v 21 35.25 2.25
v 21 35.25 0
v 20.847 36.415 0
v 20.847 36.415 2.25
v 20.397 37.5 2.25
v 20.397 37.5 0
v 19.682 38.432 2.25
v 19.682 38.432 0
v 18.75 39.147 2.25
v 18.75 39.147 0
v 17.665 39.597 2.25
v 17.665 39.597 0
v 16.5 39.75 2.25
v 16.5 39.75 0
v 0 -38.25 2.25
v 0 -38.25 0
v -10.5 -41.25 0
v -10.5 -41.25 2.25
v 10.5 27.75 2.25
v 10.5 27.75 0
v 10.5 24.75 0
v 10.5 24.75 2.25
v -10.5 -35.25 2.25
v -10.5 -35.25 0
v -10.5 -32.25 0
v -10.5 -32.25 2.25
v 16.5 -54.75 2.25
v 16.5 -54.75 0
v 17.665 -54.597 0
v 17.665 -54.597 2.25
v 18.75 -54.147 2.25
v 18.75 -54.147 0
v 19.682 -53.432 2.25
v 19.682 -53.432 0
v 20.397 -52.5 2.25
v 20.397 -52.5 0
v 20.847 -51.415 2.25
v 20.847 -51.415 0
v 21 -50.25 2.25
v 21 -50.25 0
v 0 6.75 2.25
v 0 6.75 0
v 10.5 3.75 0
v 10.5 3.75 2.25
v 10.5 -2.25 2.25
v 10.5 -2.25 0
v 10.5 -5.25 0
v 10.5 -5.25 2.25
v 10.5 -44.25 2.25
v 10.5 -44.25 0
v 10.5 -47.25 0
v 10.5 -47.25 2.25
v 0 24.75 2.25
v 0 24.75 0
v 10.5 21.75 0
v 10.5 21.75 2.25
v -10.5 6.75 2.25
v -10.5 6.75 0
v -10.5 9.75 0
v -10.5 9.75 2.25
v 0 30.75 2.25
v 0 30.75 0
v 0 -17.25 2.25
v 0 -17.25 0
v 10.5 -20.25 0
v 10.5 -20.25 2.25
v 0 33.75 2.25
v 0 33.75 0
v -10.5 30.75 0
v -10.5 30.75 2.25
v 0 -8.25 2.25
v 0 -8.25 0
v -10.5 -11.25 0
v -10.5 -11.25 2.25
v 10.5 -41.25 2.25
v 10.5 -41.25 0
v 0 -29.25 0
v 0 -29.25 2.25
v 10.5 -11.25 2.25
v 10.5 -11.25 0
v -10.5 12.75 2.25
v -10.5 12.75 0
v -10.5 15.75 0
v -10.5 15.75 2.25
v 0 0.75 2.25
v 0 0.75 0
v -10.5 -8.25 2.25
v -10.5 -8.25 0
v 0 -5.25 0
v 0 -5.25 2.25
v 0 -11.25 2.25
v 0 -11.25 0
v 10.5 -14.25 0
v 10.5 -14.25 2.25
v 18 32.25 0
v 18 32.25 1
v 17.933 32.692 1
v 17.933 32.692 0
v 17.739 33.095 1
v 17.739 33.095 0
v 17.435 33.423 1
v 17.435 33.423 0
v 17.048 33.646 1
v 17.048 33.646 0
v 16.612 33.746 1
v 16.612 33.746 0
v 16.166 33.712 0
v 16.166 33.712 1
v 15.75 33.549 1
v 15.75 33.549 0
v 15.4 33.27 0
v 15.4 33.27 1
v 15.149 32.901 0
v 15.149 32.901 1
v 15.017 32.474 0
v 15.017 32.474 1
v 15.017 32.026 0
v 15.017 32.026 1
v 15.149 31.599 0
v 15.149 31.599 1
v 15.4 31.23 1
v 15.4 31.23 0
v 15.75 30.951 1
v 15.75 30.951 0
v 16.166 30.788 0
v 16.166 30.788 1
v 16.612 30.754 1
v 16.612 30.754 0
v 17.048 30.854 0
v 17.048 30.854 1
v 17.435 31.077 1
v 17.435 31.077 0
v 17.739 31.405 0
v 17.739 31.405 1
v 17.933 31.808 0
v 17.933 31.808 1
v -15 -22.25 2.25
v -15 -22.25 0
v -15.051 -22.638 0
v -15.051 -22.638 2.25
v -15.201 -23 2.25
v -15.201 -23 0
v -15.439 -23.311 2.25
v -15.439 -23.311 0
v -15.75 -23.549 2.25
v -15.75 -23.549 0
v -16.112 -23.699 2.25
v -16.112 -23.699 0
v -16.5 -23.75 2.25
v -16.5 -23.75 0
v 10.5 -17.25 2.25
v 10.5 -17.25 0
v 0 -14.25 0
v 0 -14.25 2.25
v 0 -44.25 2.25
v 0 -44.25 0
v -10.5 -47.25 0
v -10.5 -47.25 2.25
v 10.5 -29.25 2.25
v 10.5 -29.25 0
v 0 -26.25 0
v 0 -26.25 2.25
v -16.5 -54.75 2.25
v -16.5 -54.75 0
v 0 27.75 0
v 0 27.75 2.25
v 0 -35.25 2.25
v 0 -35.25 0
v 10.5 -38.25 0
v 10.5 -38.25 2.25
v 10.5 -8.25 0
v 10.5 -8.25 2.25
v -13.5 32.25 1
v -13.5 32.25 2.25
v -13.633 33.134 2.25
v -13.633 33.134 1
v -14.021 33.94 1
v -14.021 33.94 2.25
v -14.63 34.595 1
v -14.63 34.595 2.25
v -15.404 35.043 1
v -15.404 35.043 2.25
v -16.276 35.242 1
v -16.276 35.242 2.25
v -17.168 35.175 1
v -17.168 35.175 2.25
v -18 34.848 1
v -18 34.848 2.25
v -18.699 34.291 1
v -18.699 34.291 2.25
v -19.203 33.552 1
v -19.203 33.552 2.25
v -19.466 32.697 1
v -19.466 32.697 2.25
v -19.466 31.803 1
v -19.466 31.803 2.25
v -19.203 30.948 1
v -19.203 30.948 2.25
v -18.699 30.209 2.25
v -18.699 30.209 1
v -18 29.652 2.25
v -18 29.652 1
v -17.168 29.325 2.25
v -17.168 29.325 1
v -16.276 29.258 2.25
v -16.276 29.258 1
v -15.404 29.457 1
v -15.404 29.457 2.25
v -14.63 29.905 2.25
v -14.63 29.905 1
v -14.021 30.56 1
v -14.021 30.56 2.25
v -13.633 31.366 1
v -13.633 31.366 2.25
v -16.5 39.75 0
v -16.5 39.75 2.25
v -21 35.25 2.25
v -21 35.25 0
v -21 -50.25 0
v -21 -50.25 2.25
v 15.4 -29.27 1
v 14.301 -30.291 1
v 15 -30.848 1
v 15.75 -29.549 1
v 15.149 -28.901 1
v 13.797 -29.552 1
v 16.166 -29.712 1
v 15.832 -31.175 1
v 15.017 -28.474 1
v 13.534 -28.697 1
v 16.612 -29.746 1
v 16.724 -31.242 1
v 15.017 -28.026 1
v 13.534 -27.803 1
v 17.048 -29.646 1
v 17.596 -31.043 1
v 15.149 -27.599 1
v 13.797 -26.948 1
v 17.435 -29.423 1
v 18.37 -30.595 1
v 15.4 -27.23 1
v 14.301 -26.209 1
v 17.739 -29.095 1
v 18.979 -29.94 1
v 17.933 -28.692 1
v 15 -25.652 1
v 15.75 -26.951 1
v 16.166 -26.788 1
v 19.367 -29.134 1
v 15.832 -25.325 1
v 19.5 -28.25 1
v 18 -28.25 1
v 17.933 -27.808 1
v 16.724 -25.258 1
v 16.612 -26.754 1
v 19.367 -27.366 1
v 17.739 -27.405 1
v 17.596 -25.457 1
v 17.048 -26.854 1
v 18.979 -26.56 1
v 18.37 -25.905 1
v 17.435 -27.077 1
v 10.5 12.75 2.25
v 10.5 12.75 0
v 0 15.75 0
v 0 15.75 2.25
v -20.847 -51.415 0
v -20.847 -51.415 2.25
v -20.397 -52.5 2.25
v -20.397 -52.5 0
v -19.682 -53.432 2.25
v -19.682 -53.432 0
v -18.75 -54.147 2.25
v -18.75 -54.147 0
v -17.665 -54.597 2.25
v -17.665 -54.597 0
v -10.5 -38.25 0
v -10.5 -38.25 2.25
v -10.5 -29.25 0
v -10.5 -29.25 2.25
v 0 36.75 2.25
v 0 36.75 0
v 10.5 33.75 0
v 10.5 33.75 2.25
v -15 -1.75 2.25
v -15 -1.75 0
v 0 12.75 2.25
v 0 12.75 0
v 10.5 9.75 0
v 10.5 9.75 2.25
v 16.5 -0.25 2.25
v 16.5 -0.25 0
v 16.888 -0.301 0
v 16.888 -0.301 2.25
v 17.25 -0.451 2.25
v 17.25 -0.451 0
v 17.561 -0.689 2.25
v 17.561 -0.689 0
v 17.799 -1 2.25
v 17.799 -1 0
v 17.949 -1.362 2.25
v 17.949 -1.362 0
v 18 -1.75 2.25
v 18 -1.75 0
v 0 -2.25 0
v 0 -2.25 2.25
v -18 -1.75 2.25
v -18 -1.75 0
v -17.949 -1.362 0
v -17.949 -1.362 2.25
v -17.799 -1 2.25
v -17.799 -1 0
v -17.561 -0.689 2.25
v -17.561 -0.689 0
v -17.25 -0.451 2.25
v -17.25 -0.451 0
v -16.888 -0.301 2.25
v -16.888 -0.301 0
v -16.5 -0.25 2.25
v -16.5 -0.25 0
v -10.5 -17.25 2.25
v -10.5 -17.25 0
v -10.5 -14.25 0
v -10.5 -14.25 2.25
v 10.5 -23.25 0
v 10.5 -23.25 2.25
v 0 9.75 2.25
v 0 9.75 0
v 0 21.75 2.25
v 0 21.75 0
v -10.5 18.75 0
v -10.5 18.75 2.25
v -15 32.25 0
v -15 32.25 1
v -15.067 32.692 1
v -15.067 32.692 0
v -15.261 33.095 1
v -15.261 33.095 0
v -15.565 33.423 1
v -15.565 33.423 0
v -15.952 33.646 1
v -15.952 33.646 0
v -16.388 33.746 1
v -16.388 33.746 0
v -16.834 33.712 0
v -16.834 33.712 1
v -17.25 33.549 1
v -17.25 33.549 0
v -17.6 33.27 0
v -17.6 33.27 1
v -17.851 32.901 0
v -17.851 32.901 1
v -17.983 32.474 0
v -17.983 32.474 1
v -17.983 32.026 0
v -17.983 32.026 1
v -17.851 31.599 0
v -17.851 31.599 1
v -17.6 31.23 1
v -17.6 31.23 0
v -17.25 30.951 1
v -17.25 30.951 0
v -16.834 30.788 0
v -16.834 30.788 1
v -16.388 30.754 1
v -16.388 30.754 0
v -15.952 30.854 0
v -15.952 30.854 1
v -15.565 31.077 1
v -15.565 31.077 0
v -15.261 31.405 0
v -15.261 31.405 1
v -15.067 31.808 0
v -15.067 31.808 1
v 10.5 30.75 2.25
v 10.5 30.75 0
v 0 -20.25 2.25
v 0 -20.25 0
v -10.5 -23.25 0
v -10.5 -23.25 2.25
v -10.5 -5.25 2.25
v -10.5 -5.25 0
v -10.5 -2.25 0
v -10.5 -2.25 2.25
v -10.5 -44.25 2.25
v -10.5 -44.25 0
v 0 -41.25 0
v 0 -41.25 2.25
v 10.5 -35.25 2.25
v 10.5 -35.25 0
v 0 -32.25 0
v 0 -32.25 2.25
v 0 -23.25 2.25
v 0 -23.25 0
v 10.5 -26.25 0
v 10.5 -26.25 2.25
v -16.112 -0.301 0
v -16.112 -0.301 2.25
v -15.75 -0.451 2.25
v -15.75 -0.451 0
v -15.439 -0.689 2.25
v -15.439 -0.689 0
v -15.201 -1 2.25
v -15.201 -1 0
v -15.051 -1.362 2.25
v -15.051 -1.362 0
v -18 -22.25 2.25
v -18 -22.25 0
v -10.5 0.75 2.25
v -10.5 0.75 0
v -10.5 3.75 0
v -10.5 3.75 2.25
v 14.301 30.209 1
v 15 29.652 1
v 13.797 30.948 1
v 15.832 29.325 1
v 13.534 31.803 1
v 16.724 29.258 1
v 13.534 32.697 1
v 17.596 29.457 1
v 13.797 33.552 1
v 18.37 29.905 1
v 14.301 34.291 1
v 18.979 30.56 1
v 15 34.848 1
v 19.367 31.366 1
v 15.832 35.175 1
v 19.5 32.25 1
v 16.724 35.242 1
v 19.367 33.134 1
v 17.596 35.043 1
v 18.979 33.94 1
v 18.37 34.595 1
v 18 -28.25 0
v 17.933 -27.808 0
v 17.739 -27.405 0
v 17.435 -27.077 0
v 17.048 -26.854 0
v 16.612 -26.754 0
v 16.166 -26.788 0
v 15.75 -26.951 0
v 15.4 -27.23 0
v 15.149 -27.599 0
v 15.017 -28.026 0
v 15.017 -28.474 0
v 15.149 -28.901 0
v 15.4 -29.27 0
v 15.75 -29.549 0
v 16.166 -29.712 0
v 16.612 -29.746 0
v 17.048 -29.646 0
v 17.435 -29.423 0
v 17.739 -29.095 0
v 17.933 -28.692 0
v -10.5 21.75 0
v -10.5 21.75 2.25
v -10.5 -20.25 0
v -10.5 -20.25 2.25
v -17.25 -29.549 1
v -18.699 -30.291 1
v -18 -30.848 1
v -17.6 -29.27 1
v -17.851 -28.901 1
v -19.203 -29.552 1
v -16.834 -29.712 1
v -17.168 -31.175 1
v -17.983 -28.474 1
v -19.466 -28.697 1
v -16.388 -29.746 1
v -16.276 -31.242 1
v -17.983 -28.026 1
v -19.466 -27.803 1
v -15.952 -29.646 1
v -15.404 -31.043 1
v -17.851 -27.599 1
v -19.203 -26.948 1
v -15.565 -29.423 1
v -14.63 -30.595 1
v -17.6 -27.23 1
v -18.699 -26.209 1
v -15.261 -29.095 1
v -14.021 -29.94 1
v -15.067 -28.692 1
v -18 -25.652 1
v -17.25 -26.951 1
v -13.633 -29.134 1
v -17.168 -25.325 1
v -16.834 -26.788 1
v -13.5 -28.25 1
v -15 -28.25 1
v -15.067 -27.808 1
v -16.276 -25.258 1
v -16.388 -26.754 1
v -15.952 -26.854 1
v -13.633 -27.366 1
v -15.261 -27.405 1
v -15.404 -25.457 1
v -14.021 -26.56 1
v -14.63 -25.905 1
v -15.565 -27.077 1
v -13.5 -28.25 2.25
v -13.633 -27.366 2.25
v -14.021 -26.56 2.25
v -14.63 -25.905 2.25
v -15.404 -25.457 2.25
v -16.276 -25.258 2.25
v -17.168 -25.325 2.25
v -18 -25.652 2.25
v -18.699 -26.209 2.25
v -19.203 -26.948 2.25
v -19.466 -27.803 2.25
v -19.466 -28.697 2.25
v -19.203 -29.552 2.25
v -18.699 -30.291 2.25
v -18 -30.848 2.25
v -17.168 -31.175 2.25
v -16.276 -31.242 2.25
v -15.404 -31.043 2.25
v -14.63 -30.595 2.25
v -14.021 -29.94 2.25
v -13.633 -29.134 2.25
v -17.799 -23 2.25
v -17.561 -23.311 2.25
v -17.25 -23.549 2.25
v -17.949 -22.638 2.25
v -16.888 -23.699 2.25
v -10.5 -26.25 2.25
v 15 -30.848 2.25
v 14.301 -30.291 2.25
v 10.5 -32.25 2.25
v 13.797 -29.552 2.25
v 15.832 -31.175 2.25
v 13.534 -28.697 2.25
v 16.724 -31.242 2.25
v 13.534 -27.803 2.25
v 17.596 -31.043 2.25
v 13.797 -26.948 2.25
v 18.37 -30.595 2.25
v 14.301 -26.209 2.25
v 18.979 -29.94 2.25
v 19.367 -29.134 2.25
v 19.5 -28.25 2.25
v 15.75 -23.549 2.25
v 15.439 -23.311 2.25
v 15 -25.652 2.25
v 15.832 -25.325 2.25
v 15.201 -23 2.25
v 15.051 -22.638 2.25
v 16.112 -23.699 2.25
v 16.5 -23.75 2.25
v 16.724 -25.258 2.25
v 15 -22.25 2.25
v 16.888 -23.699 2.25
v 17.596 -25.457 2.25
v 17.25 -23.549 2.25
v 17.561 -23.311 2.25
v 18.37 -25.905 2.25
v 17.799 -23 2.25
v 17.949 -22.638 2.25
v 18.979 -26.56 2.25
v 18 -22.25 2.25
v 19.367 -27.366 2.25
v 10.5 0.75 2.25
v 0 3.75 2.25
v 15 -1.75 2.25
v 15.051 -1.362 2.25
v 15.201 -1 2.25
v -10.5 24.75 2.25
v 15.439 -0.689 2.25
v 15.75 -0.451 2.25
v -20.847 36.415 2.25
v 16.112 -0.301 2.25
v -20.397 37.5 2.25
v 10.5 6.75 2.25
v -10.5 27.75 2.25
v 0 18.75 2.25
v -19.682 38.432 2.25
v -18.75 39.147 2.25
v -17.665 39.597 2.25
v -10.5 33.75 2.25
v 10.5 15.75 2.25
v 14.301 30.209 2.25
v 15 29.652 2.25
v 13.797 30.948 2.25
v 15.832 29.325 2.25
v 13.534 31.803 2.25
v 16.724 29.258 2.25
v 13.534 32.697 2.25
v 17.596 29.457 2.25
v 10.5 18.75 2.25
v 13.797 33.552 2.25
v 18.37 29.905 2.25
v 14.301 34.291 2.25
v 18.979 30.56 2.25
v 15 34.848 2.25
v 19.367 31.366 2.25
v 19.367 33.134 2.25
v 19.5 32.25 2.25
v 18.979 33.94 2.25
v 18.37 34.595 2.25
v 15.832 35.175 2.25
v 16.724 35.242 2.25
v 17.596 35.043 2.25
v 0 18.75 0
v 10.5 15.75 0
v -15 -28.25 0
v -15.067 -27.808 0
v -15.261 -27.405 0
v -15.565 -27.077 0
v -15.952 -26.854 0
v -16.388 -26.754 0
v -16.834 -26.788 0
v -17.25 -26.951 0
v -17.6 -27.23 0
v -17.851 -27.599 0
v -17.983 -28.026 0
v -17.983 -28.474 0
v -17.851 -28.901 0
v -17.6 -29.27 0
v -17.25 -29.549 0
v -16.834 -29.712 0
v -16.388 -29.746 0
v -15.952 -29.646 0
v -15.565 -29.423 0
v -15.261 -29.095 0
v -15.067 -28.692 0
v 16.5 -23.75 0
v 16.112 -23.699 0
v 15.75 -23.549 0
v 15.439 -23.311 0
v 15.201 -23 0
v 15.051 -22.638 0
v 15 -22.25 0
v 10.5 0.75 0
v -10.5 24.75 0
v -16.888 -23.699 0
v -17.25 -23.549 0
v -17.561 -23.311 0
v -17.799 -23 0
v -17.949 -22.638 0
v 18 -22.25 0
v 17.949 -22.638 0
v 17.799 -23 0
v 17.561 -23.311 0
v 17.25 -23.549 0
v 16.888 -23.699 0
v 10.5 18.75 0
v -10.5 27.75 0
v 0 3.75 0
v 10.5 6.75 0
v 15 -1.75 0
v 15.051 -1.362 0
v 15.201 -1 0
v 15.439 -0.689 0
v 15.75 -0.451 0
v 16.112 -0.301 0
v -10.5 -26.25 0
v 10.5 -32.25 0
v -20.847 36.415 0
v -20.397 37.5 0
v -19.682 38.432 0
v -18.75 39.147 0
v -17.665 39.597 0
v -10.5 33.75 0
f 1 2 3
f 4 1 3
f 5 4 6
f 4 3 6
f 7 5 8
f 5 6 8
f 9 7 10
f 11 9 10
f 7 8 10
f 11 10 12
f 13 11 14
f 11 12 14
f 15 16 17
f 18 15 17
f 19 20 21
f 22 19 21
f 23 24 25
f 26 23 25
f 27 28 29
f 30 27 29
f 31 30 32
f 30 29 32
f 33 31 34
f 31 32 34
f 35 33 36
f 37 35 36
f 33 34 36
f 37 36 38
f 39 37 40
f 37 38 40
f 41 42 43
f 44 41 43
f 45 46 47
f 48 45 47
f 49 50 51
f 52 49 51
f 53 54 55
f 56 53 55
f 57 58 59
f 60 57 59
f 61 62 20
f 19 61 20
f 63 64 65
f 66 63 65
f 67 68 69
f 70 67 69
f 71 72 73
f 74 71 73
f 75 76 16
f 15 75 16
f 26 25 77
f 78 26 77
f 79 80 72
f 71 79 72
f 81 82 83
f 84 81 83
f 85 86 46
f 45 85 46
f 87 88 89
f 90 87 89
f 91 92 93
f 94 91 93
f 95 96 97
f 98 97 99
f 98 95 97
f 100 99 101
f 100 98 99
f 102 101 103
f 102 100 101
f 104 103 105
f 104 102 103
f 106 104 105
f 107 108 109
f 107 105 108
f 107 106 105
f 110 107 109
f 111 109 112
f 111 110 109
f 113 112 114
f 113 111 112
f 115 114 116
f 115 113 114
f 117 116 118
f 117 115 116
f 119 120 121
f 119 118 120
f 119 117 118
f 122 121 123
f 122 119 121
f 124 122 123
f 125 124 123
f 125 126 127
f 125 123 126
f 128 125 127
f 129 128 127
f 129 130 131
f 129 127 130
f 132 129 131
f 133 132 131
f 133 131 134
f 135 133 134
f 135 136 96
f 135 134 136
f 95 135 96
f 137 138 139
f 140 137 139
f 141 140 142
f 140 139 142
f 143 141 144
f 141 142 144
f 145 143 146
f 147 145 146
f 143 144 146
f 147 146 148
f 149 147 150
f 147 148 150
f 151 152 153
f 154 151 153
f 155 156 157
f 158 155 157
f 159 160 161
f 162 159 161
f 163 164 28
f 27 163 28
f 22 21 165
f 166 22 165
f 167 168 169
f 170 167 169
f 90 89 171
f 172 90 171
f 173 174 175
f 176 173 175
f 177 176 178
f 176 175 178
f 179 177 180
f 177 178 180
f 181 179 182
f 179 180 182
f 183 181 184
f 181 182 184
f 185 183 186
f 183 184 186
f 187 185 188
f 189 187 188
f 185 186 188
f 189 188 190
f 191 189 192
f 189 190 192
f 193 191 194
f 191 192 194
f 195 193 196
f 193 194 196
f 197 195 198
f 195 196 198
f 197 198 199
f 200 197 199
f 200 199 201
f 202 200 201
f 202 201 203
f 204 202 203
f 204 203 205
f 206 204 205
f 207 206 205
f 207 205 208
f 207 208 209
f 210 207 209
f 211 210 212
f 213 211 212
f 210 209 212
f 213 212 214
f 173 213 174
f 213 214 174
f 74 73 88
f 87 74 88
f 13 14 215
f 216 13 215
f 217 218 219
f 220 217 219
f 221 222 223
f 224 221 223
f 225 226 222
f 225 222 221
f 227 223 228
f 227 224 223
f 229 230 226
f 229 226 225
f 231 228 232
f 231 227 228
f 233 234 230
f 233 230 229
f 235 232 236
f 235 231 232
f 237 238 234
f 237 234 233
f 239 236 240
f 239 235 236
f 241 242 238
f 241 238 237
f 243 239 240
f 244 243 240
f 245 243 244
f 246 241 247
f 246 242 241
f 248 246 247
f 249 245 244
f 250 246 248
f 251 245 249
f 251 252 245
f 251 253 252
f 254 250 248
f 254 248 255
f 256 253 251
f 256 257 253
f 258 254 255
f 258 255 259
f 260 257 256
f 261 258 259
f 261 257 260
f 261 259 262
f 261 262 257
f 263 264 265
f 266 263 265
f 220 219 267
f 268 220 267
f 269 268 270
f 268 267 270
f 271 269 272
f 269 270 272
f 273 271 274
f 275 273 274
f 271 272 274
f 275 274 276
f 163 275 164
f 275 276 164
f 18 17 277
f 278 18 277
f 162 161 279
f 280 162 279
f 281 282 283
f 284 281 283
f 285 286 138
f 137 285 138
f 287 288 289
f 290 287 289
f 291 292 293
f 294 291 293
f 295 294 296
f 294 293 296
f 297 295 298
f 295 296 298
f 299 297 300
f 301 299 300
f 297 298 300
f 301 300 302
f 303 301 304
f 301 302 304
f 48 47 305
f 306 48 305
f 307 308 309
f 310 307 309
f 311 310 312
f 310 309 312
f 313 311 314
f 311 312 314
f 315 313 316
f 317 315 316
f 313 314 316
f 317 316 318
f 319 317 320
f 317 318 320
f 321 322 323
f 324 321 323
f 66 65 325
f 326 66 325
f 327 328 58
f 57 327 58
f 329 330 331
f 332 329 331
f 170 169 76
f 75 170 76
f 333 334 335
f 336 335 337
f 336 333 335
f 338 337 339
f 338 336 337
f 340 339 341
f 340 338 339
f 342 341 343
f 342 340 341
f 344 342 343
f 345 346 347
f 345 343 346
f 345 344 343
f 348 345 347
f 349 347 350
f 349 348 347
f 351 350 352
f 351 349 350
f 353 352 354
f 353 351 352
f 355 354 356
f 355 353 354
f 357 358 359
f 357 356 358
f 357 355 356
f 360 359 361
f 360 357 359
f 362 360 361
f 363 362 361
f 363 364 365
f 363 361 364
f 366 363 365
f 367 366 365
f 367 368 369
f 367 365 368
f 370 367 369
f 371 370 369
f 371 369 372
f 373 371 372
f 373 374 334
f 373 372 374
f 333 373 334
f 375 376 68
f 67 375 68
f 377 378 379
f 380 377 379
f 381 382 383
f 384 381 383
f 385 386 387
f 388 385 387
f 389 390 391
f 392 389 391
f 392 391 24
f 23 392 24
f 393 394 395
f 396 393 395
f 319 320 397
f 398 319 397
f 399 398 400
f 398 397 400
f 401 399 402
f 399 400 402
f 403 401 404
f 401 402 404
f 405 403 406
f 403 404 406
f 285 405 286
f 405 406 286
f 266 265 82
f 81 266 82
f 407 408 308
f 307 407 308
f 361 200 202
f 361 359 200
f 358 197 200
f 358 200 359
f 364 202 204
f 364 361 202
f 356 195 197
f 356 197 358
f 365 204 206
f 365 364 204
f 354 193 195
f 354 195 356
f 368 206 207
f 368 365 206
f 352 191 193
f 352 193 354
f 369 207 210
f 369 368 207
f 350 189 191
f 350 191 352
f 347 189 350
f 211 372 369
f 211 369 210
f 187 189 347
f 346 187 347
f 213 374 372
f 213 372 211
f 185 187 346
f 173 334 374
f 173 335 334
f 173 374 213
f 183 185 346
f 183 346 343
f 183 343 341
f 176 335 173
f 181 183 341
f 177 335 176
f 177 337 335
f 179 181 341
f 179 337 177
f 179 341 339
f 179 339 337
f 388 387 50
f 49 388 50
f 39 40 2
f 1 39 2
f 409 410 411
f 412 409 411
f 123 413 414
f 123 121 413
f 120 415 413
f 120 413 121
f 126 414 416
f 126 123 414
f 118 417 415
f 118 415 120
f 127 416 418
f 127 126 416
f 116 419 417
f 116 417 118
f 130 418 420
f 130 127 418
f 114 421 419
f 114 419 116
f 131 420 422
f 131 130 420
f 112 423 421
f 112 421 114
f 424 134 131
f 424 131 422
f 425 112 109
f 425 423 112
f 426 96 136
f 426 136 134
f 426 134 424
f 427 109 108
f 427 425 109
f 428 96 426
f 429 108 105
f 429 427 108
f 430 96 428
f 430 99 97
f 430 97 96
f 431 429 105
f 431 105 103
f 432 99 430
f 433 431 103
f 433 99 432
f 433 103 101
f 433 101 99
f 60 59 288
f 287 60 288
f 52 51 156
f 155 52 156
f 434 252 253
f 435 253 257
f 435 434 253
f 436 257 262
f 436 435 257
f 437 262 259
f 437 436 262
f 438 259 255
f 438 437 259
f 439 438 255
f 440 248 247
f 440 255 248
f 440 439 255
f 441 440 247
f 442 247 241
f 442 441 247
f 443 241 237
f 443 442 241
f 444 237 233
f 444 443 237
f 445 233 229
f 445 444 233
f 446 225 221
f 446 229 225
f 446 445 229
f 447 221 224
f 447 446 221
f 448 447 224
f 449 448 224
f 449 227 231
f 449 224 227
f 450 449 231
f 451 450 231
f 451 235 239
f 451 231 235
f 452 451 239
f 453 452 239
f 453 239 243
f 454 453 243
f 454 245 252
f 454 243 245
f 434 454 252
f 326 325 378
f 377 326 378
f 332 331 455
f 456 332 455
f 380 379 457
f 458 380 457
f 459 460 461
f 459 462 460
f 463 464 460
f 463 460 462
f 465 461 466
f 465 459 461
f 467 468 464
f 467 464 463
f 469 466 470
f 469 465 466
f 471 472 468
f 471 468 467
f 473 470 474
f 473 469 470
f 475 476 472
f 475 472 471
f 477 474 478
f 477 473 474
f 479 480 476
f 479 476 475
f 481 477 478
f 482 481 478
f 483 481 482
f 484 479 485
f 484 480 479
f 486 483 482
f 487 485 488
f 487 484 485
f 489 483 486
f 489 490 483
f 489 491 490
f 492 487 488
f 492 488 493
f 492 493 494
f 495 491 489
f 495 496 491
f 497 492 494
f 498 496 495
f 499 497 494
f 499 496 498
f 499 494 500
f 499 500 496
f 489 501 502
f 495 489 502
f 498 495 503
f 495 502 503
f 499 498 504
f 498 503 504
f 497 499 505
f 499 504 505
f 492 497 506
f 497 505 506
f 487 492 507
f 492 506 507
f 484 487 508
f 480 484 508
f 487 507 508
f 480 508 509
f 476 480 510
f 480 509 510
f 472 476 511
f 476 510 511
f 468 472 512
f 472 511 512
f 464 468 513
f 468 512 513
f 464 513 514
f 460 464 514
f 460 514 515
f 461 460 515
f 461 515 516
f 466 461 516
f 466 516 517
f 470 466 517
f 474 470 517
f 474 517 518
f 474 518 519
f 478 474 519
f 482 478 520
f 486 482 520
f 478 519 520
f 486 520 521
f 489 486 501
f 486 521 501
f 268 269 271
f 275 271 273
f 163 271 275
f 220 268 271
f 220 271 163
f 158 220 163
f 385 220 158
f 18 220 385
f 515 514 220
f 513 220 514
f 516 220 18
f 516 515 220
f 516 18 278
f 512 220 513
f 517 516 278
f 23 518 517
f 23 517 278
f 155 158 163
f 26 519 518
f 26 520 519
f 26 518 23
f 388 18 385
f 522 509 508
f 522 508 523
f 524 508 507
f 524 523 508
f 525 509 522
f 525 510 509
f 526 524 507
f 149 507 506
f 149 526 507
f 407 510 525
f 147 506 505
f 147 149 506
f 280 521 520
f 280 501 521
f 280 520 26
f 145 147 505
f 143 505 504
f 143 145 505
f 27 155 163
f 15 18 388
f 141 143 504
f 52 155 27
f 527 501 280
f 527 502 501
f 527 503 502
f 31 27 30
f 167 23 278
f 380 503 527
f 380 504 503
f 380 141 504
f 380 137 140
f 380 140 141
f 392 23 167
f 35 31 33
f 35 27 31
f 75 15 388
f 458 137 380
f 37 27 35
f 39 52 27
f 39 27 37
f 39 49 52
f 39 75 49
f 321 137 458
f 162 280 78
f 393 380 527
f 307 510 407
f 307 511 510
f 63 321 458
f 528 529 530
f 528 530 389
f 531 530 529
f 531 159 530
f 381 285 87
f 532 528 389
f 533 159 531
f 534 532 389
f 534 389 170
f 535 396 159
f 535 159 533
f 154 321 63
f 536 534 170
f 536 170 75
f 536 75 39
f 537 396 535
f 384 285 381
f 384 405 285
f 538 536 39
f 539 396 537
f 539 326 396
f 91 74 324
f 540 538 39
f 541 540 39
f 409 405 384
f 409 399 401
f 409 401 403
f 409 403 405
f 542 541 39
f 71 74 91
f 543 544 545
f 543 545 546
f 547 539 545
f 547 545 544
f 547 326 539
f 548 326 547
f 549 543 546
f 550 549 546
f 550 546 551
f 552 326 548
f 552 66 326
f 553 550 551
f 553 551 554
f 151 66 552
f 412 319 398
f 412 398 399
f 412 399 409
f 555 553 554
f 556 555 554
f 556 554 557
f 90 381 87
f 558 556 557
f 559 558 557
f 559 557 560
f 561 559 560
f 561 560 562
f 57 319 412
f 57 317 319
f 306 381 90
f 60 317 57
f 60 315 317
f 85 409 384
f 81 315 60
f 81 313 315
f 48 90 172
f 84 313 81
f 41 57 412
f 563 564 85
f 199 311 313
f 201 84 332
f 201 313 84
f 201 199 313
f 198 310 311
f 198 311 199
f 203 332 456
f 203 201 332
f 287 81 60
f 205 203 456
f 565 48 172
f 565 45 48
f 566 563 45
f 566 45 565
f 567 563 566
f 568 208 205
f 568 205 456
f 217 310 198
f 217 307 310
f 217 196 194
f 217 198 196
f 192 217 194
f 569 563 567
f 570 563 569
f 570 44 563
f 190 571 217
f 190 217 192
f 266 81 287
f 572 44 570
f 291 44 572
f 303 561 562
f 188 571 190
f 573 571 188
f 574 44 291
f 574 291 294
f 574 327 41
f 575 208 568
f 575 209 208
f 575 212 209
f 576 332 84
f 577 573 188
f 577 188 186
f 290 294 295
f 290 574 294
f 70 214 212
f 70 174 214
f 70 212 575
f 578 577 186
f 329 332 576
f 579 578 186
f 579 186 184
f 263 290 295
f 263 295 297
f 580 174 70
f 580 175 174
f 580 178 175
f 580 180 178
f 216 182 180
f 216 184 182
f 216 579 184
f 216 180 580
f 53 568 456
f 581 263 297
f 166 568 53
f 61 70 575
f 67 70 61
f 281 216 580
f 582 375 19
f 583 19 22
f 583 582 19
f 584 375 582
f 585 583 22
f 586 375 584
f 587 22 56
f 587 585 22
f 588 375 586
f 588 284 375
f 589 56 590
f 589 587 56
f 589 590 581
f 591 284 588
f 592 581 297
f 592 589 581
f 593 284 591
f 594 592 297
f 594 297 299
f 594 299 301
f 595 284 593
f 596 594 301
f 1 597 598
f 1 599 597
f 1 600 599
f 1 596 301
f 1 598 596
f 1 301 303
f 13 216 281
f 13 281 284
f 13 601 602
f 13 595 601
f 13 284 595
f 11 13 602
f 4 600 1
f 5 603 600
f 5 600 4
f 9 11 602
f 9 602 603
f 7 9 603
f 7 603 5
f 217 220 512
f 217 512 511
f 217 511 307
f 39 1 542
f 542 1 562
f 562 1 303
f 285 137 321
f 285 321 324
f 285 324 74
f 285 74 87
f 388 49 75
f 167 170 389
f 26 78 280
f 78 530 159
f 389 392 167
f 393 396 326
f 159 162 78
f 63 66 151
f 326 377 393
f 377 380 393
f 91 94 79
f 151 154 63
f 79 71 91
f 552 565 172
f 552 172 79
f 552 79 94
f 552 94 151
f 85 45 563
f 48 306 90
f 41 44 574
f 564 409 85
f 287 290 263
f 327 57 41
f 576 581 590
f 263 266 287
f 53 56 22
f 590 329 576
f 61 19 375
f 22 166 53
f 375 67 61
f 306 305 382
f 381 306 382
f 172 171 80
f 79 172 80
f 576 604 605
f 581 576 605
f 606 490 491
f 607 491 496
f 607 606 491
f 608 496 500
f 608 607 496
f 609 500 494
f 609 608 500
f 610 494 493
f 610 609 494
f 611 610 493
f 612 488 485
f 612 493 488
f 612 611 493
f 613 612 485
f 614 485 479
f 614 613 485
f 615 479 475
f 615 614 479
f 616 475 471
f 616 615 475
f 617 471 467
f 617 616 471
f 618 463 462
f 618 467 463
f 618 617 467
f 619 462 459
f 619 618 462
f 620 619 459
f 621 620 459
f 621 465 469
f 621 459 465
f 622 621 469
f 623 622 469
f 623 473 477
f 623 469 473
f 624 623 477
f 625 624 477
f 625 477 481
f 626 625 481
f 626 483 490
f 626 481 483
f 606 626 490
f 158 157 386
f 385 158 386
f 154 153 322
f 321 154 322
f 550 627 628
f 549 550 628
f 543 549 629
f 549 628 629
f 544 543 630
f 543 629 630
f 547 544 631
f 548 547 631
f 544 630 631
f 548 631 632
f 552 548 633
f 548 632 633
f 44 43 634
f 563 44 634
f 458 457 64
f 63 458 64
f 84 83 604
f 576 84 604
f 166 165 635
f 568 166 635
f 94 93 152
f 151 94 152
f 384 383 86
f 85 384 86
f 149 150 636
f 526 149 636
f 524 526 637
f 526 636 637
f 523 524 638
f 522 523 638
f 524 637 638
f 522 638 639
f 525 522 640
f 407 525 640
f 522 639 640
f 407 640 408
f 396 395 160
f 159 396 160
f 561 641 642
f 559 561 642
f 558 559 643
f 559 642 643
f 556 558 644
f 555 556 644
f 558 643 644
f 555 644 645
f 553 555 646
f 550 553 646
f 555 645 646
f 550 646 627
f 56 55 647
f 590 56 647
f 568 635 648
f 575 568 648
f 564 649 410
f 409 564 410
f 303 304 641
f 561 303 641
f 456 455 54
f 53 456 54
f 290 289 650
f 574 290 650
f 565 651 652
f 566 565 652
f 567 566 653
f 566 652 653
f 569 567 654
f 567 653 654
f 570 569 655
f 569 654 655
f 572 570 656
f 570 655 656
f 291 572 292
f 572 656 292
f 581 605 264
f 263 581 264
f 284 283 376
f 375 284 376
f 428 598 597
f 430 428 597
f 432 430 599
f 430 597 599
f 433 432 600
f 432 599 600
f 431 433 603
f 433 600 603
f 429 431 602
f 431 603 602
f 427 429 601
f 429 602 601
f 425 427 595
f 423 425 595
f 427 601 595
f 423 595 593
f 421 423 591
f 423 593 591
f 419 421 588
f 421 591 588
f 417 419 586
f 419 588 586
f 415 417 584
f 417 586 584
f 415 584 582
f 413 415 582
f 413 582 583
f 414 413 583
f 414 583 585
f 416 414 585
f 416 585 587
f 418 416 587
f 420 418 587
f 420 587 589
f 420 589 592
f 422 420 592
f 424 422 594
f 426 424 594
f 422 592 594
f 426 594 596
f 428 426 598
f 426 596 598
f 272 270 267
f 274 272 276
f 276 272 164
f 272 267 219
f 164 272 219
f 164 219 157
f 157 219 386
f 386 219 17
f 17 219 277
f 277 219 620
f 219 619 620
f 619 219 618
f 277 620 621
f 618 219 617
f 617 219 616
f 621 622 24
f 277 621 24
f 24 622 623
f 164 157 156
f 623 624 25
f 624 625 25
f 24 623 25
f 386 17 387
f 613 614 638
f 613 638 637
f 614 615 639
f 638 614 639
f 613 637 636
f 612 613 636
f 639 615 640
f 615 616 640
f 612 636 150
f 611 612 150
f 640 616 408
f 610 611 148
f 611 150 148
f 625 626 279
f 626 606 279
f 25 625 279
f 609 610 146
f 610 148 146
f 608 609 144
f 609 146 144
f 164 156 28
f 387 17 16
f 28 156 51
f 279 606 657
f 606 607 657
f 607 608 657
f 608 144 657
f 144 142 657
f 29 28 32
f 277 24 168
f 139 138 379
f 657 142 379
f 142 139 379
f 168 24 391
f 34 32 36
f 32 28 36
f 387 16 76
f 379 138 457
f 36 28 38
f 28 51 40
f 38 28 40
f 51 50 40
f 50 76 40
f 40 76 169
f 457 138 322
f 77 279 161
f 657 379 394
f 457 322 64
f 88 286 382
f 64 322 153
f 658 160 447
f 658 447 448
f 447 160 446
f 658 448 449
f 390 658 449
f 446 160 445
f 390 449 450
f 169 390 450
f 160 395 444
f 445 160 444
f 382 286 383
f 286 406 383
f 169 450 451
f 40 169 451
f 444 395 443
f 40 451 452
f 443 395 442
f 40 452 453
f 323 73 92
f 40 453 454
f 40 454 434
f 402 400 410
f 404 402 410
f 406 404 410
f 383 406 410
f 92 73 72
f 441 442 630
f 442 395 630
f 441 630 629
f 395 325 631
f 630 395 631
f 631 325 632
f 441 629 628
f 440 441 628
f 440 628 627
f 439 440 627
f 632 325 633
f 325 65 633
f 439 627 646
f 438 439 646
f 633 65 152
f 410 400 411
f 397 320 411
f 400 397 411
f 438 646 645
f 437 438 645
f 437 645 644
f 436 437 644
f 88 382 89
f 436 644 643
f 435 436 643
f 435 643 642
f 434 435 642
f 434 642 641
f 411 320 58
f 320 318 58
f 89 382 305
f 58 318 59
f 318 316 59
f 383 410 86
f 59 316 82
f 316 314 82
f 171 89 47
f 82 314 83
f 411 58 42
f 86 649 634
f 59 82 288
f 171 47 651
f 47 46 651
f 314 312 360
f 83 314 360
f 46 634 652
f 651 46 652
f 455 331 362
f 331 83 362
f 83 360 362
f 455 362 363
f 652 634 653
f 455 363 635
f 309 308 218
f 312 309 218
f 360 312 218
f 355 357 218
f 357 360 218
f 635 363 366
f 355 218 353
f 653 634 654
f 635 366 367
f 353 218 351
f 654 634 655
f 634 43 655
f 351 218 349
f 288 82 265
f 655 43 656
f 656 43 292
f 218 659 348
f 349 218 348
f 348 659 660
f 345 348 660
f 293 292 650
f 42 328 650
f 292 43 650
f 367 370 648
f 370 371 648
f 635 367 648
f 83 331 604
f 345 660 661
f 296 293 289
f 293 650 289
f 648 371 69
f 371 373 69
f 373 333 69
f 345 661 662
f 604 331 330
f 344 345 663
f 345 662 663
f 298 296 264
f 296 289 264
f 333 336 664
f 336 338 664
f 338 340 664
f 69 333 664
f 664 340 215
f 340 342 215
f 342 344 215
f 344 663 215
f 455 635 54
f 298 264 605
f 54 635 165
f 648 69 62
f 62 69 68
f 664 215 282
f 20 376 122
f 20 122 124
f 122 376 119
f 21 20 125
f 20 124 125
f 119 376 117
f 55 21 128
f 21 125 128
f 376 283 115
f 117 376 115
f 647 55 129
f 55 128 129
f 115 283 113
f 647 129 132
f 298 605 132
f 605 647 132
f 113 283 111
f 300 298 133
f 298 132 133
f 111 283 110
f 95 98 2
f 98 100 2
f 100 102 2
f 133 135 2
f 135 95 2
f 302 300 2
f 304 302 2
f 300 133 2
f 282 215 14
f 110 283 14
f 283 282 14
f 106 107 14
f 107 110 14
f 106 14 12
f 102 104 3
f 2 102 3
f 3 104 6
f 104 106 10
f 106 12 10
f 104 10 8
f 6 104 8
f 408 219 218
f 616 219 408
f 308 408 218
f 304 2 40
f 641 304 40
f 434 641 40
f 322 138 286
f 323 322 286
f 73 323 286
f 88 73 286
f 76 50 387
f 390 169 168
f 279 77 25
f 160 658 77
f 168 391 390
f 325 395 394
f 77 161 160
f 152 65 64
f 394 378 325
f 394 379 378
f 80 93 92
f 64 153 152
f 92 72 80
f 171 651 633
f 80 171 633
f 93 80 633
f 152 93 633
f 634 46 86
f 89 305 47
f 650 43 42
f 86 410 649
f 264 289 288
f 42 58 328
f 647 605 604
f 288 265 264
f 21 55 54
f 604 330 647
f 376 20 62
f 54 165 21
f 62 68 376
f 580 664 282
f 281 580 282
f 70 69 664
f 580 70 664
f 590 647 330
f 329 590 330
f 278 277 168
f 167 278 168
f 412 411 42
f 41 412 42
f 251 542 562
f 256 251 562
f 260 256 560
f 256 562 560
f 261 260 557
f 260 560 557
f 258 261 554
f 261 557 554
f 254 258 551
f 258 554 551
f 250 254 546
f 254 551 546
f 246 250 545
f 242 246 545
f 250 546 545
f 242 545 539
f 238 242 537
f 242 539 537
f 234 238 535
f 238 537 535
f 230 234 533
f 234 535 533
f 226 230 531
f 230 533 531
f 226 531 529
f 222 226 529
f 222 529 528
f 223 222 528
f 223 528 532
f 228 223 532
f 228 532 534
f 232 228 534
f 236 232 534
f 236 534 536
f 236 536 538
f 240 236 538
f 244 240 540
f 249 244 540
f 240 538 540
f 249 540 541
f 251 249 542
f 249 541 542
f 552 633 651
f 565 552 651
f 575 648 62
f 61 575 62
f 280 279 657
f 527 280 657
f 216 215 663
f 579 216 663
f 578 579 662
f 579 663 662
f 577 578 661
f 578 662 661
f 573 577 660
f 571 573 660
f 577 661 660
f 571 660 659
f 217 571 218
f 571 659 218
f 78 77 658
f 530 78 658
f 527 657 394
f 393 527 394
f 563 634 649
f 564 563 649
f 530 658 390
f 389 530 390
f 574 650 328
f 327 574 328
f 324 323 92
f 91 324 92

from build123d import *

# Parameters (mm, degrees)
F0_R     = 1.5
F1_DEPTH = 2.25
F2_R     = 3
F3_DEPTH = 1.25


with BuildPart() as f1:
    # F0 (on Top) → F1 (new body)
    with BuildSketch(Plane.XY):
        with BuildLine():
            ThreePointArc((-16.5, 39.75), (-19.681981, 38.431981), (-21, 35.25))
            Line((-21, 35.25), (-21, -44.25))
            Line((-21, -44.25), (-21, -50.25))
            ThreePointArc((-21, -50.25), (-19.681981, -53.431981), (-16.5, -54.75))
            Line((-16.5, -54.75), (16.5, -54.75))
            ThreePointArc((16.5, -54.75), (19.681981, -53.431981), (21, -50.25))
            Line((21, -50.25), (21, -44.25))
            Line((21, -44.25), (21, 35.25))
            ThreePointArc((21, 35.25), (19.681981, 38.431981), (16.5, 39.75))
            Line((16.5, 39.75), (-16.5, 39.75))
        make_face()
        with Locations((-16.5, -28.25)):
            Circle(F0_R, mode=Mode.SUBTRACT)
        with BuildLine():
            ThreePointArc((-16.5, -0.25), (-15.43934, -0.68934), (-15, -1.75))
            Line((-15, -1.75), (-15, -22.25))
            ThreePointArc((-15, -22.25), (-15.43934, -23.31066), (-16.5, -23.75))
            ThreePointArc((-16.5, -23.75), (-17.56066, -23.31066), (-18, -22.25))
            Line((-18, -22.25), (-18, -1.75))
            ThreePointArc((-18, -1.75), (-17.56066, -0.68934), (-16.5, -0.25))
        make_face(mode=Mode.SUBTRACT)
        Polygon((-10.5, -44.25), (0, -41.25), (10.5, -44.25), (10.5, -47.25), (0, -44.25), (-10.5, -47.25), align=None, mode=Mode.SUBTRACT)
        Polygon((-10.5, -38.25), (0, -35.25), (10.5, -38.25), (10.5, -41.25), (0, -38.25), (-10.5, -41.25), align=None, mode=Mode.SUBTRACT)
        Polygon((-10.5, -32.25), (0, -29.25), (10.5, -32.25), (10.5, -35.25), (0, -32.25), (-10.5, -35.25), align=None, mode=Mode.SUBTRACT)
        Polygon((-10.5, -26.25), (0, -23.25), (10.5, -26.25), (10.5, -29.25), (0, -26.25), (-10.5, -29.25), align=None, mode=Mode.SUBTRACT)
        Polygon((-10.5, -20.25), (0, -17.25), (10.5, -20.25), (10.5, -23.25), (0, -20.25), (-10.5, -23.25), align=None, mode=Mode.SUBTRACT)
        Polygon((-10.5, -14.25), (0, -11.25), (10.5, -14.25), (10.5, -17.25), (0, -14.25), (-10.5, -17.25), align=None, mode=Mode.SUBTRACT)
        Polygon((-10.5, -8.25), (0, -5.25), (10.5, -8.25), (10.5, -11.25), (0, -8.25), (-10.5, -11.25), align=None, mode=Mode.SUBTRACT)
        with Locations((16.5, -28.25)):
            Circle(F0_R, mode=Mode.SUBTRACT)
        with BuildLine():
            ThreePointArc((16.5, -0.25), (17.56066, -0.68934), (18, -1.75))
            Line((18, -1.75), (18, -22.25))
            ThreePointArc((18, -22.25), (17.56066, -23.31066), (16.5, -23.75))
            ThreePointArc((16.5, -23.75), (15.43934, -23.31066), (15, -22.25))
            Line((15, -22.25), (15, -1.75))
            ThreePointArc((15, -1.75), (15.43934, -0.68934), (16.5, -0.25))
        make_face(mode=Mode.SUBTRACT)
        with Locations((-16.5, 32.25)):
            Circle(F0_R, mode=Mode.SUBTRACT)
        Polygon((-10.5, -2.25), (0, 0.75), (10.5, -2.25), (10.5, -5.25), (0, -2.25), (-10.5, -5.25), align=None, mode=Mode.SUBTRACT)
        Polygon((-10.5, 3.75), (0, 6.75), (10.5, 3.75), (10.5, 0.75), (0, 3.75), (-10.5, 0.75), align=None, mode=Mode.SUBTRACT)
        Polygon((-10.5, 9.75), (0, 12.75), (10.5, 9.75), (10.5, 6.75), (0, 9.75), (-10.5, 6.75), align=None, mode=Mode.SUBTRACT)
        Polygon((-10.5, 15.75), (0, 18.75), (10.5, 15.75), (10.5, 12.75), (0, 15.75), (-10.5, 12.75), align=None, mode=Mode.SUBTRACT)
        Polygon((-10.5, 21.75), (0, 24.75), (10.5, 21.75), (10.5, 18.75), (0, 21.75), (-10.5, 18.75), align=None, mode=Mode.SUBTRACT)
        Polygon((-10.5, 27.75), (0, 30.75), (10.5, 27.75), (10.5, 24.75), (0, 27.75), (-10.5, 24.75), align=None, mode=Mode.SUBTRACT)
        Polygon((-10.5, 33.75), (0, 36.75), (10.5, 33.75), (10.5, 30.75), (0, 33.75), (-10.5, 30.75), align=None, mode=Mode.SUBTRACT)
        with Locations((16.5, 32.25)):
            Circle(F0_R, mode=Mode.SUBTRACT)
    extrude(amount=F1_DEPTH)

    # F2 (on face) → F3 (cut)
    with BuildSketch(Plane.XY.offset(2.25)):
        with Locations((-16.5, -28.25)):
            Circle(F2_R)
        with Locations((16.5, -28.25)):
            Circle(F2_R)
        with Locations((16.5, 32.25)):
            Circle(F2_R)
        with Locations((-16.5, 32.25)):
            Circle(F2_R)
    extrude(amount=-F3_DEPTH, mode=Mode.SUBTRACT)


solid = f1.part
